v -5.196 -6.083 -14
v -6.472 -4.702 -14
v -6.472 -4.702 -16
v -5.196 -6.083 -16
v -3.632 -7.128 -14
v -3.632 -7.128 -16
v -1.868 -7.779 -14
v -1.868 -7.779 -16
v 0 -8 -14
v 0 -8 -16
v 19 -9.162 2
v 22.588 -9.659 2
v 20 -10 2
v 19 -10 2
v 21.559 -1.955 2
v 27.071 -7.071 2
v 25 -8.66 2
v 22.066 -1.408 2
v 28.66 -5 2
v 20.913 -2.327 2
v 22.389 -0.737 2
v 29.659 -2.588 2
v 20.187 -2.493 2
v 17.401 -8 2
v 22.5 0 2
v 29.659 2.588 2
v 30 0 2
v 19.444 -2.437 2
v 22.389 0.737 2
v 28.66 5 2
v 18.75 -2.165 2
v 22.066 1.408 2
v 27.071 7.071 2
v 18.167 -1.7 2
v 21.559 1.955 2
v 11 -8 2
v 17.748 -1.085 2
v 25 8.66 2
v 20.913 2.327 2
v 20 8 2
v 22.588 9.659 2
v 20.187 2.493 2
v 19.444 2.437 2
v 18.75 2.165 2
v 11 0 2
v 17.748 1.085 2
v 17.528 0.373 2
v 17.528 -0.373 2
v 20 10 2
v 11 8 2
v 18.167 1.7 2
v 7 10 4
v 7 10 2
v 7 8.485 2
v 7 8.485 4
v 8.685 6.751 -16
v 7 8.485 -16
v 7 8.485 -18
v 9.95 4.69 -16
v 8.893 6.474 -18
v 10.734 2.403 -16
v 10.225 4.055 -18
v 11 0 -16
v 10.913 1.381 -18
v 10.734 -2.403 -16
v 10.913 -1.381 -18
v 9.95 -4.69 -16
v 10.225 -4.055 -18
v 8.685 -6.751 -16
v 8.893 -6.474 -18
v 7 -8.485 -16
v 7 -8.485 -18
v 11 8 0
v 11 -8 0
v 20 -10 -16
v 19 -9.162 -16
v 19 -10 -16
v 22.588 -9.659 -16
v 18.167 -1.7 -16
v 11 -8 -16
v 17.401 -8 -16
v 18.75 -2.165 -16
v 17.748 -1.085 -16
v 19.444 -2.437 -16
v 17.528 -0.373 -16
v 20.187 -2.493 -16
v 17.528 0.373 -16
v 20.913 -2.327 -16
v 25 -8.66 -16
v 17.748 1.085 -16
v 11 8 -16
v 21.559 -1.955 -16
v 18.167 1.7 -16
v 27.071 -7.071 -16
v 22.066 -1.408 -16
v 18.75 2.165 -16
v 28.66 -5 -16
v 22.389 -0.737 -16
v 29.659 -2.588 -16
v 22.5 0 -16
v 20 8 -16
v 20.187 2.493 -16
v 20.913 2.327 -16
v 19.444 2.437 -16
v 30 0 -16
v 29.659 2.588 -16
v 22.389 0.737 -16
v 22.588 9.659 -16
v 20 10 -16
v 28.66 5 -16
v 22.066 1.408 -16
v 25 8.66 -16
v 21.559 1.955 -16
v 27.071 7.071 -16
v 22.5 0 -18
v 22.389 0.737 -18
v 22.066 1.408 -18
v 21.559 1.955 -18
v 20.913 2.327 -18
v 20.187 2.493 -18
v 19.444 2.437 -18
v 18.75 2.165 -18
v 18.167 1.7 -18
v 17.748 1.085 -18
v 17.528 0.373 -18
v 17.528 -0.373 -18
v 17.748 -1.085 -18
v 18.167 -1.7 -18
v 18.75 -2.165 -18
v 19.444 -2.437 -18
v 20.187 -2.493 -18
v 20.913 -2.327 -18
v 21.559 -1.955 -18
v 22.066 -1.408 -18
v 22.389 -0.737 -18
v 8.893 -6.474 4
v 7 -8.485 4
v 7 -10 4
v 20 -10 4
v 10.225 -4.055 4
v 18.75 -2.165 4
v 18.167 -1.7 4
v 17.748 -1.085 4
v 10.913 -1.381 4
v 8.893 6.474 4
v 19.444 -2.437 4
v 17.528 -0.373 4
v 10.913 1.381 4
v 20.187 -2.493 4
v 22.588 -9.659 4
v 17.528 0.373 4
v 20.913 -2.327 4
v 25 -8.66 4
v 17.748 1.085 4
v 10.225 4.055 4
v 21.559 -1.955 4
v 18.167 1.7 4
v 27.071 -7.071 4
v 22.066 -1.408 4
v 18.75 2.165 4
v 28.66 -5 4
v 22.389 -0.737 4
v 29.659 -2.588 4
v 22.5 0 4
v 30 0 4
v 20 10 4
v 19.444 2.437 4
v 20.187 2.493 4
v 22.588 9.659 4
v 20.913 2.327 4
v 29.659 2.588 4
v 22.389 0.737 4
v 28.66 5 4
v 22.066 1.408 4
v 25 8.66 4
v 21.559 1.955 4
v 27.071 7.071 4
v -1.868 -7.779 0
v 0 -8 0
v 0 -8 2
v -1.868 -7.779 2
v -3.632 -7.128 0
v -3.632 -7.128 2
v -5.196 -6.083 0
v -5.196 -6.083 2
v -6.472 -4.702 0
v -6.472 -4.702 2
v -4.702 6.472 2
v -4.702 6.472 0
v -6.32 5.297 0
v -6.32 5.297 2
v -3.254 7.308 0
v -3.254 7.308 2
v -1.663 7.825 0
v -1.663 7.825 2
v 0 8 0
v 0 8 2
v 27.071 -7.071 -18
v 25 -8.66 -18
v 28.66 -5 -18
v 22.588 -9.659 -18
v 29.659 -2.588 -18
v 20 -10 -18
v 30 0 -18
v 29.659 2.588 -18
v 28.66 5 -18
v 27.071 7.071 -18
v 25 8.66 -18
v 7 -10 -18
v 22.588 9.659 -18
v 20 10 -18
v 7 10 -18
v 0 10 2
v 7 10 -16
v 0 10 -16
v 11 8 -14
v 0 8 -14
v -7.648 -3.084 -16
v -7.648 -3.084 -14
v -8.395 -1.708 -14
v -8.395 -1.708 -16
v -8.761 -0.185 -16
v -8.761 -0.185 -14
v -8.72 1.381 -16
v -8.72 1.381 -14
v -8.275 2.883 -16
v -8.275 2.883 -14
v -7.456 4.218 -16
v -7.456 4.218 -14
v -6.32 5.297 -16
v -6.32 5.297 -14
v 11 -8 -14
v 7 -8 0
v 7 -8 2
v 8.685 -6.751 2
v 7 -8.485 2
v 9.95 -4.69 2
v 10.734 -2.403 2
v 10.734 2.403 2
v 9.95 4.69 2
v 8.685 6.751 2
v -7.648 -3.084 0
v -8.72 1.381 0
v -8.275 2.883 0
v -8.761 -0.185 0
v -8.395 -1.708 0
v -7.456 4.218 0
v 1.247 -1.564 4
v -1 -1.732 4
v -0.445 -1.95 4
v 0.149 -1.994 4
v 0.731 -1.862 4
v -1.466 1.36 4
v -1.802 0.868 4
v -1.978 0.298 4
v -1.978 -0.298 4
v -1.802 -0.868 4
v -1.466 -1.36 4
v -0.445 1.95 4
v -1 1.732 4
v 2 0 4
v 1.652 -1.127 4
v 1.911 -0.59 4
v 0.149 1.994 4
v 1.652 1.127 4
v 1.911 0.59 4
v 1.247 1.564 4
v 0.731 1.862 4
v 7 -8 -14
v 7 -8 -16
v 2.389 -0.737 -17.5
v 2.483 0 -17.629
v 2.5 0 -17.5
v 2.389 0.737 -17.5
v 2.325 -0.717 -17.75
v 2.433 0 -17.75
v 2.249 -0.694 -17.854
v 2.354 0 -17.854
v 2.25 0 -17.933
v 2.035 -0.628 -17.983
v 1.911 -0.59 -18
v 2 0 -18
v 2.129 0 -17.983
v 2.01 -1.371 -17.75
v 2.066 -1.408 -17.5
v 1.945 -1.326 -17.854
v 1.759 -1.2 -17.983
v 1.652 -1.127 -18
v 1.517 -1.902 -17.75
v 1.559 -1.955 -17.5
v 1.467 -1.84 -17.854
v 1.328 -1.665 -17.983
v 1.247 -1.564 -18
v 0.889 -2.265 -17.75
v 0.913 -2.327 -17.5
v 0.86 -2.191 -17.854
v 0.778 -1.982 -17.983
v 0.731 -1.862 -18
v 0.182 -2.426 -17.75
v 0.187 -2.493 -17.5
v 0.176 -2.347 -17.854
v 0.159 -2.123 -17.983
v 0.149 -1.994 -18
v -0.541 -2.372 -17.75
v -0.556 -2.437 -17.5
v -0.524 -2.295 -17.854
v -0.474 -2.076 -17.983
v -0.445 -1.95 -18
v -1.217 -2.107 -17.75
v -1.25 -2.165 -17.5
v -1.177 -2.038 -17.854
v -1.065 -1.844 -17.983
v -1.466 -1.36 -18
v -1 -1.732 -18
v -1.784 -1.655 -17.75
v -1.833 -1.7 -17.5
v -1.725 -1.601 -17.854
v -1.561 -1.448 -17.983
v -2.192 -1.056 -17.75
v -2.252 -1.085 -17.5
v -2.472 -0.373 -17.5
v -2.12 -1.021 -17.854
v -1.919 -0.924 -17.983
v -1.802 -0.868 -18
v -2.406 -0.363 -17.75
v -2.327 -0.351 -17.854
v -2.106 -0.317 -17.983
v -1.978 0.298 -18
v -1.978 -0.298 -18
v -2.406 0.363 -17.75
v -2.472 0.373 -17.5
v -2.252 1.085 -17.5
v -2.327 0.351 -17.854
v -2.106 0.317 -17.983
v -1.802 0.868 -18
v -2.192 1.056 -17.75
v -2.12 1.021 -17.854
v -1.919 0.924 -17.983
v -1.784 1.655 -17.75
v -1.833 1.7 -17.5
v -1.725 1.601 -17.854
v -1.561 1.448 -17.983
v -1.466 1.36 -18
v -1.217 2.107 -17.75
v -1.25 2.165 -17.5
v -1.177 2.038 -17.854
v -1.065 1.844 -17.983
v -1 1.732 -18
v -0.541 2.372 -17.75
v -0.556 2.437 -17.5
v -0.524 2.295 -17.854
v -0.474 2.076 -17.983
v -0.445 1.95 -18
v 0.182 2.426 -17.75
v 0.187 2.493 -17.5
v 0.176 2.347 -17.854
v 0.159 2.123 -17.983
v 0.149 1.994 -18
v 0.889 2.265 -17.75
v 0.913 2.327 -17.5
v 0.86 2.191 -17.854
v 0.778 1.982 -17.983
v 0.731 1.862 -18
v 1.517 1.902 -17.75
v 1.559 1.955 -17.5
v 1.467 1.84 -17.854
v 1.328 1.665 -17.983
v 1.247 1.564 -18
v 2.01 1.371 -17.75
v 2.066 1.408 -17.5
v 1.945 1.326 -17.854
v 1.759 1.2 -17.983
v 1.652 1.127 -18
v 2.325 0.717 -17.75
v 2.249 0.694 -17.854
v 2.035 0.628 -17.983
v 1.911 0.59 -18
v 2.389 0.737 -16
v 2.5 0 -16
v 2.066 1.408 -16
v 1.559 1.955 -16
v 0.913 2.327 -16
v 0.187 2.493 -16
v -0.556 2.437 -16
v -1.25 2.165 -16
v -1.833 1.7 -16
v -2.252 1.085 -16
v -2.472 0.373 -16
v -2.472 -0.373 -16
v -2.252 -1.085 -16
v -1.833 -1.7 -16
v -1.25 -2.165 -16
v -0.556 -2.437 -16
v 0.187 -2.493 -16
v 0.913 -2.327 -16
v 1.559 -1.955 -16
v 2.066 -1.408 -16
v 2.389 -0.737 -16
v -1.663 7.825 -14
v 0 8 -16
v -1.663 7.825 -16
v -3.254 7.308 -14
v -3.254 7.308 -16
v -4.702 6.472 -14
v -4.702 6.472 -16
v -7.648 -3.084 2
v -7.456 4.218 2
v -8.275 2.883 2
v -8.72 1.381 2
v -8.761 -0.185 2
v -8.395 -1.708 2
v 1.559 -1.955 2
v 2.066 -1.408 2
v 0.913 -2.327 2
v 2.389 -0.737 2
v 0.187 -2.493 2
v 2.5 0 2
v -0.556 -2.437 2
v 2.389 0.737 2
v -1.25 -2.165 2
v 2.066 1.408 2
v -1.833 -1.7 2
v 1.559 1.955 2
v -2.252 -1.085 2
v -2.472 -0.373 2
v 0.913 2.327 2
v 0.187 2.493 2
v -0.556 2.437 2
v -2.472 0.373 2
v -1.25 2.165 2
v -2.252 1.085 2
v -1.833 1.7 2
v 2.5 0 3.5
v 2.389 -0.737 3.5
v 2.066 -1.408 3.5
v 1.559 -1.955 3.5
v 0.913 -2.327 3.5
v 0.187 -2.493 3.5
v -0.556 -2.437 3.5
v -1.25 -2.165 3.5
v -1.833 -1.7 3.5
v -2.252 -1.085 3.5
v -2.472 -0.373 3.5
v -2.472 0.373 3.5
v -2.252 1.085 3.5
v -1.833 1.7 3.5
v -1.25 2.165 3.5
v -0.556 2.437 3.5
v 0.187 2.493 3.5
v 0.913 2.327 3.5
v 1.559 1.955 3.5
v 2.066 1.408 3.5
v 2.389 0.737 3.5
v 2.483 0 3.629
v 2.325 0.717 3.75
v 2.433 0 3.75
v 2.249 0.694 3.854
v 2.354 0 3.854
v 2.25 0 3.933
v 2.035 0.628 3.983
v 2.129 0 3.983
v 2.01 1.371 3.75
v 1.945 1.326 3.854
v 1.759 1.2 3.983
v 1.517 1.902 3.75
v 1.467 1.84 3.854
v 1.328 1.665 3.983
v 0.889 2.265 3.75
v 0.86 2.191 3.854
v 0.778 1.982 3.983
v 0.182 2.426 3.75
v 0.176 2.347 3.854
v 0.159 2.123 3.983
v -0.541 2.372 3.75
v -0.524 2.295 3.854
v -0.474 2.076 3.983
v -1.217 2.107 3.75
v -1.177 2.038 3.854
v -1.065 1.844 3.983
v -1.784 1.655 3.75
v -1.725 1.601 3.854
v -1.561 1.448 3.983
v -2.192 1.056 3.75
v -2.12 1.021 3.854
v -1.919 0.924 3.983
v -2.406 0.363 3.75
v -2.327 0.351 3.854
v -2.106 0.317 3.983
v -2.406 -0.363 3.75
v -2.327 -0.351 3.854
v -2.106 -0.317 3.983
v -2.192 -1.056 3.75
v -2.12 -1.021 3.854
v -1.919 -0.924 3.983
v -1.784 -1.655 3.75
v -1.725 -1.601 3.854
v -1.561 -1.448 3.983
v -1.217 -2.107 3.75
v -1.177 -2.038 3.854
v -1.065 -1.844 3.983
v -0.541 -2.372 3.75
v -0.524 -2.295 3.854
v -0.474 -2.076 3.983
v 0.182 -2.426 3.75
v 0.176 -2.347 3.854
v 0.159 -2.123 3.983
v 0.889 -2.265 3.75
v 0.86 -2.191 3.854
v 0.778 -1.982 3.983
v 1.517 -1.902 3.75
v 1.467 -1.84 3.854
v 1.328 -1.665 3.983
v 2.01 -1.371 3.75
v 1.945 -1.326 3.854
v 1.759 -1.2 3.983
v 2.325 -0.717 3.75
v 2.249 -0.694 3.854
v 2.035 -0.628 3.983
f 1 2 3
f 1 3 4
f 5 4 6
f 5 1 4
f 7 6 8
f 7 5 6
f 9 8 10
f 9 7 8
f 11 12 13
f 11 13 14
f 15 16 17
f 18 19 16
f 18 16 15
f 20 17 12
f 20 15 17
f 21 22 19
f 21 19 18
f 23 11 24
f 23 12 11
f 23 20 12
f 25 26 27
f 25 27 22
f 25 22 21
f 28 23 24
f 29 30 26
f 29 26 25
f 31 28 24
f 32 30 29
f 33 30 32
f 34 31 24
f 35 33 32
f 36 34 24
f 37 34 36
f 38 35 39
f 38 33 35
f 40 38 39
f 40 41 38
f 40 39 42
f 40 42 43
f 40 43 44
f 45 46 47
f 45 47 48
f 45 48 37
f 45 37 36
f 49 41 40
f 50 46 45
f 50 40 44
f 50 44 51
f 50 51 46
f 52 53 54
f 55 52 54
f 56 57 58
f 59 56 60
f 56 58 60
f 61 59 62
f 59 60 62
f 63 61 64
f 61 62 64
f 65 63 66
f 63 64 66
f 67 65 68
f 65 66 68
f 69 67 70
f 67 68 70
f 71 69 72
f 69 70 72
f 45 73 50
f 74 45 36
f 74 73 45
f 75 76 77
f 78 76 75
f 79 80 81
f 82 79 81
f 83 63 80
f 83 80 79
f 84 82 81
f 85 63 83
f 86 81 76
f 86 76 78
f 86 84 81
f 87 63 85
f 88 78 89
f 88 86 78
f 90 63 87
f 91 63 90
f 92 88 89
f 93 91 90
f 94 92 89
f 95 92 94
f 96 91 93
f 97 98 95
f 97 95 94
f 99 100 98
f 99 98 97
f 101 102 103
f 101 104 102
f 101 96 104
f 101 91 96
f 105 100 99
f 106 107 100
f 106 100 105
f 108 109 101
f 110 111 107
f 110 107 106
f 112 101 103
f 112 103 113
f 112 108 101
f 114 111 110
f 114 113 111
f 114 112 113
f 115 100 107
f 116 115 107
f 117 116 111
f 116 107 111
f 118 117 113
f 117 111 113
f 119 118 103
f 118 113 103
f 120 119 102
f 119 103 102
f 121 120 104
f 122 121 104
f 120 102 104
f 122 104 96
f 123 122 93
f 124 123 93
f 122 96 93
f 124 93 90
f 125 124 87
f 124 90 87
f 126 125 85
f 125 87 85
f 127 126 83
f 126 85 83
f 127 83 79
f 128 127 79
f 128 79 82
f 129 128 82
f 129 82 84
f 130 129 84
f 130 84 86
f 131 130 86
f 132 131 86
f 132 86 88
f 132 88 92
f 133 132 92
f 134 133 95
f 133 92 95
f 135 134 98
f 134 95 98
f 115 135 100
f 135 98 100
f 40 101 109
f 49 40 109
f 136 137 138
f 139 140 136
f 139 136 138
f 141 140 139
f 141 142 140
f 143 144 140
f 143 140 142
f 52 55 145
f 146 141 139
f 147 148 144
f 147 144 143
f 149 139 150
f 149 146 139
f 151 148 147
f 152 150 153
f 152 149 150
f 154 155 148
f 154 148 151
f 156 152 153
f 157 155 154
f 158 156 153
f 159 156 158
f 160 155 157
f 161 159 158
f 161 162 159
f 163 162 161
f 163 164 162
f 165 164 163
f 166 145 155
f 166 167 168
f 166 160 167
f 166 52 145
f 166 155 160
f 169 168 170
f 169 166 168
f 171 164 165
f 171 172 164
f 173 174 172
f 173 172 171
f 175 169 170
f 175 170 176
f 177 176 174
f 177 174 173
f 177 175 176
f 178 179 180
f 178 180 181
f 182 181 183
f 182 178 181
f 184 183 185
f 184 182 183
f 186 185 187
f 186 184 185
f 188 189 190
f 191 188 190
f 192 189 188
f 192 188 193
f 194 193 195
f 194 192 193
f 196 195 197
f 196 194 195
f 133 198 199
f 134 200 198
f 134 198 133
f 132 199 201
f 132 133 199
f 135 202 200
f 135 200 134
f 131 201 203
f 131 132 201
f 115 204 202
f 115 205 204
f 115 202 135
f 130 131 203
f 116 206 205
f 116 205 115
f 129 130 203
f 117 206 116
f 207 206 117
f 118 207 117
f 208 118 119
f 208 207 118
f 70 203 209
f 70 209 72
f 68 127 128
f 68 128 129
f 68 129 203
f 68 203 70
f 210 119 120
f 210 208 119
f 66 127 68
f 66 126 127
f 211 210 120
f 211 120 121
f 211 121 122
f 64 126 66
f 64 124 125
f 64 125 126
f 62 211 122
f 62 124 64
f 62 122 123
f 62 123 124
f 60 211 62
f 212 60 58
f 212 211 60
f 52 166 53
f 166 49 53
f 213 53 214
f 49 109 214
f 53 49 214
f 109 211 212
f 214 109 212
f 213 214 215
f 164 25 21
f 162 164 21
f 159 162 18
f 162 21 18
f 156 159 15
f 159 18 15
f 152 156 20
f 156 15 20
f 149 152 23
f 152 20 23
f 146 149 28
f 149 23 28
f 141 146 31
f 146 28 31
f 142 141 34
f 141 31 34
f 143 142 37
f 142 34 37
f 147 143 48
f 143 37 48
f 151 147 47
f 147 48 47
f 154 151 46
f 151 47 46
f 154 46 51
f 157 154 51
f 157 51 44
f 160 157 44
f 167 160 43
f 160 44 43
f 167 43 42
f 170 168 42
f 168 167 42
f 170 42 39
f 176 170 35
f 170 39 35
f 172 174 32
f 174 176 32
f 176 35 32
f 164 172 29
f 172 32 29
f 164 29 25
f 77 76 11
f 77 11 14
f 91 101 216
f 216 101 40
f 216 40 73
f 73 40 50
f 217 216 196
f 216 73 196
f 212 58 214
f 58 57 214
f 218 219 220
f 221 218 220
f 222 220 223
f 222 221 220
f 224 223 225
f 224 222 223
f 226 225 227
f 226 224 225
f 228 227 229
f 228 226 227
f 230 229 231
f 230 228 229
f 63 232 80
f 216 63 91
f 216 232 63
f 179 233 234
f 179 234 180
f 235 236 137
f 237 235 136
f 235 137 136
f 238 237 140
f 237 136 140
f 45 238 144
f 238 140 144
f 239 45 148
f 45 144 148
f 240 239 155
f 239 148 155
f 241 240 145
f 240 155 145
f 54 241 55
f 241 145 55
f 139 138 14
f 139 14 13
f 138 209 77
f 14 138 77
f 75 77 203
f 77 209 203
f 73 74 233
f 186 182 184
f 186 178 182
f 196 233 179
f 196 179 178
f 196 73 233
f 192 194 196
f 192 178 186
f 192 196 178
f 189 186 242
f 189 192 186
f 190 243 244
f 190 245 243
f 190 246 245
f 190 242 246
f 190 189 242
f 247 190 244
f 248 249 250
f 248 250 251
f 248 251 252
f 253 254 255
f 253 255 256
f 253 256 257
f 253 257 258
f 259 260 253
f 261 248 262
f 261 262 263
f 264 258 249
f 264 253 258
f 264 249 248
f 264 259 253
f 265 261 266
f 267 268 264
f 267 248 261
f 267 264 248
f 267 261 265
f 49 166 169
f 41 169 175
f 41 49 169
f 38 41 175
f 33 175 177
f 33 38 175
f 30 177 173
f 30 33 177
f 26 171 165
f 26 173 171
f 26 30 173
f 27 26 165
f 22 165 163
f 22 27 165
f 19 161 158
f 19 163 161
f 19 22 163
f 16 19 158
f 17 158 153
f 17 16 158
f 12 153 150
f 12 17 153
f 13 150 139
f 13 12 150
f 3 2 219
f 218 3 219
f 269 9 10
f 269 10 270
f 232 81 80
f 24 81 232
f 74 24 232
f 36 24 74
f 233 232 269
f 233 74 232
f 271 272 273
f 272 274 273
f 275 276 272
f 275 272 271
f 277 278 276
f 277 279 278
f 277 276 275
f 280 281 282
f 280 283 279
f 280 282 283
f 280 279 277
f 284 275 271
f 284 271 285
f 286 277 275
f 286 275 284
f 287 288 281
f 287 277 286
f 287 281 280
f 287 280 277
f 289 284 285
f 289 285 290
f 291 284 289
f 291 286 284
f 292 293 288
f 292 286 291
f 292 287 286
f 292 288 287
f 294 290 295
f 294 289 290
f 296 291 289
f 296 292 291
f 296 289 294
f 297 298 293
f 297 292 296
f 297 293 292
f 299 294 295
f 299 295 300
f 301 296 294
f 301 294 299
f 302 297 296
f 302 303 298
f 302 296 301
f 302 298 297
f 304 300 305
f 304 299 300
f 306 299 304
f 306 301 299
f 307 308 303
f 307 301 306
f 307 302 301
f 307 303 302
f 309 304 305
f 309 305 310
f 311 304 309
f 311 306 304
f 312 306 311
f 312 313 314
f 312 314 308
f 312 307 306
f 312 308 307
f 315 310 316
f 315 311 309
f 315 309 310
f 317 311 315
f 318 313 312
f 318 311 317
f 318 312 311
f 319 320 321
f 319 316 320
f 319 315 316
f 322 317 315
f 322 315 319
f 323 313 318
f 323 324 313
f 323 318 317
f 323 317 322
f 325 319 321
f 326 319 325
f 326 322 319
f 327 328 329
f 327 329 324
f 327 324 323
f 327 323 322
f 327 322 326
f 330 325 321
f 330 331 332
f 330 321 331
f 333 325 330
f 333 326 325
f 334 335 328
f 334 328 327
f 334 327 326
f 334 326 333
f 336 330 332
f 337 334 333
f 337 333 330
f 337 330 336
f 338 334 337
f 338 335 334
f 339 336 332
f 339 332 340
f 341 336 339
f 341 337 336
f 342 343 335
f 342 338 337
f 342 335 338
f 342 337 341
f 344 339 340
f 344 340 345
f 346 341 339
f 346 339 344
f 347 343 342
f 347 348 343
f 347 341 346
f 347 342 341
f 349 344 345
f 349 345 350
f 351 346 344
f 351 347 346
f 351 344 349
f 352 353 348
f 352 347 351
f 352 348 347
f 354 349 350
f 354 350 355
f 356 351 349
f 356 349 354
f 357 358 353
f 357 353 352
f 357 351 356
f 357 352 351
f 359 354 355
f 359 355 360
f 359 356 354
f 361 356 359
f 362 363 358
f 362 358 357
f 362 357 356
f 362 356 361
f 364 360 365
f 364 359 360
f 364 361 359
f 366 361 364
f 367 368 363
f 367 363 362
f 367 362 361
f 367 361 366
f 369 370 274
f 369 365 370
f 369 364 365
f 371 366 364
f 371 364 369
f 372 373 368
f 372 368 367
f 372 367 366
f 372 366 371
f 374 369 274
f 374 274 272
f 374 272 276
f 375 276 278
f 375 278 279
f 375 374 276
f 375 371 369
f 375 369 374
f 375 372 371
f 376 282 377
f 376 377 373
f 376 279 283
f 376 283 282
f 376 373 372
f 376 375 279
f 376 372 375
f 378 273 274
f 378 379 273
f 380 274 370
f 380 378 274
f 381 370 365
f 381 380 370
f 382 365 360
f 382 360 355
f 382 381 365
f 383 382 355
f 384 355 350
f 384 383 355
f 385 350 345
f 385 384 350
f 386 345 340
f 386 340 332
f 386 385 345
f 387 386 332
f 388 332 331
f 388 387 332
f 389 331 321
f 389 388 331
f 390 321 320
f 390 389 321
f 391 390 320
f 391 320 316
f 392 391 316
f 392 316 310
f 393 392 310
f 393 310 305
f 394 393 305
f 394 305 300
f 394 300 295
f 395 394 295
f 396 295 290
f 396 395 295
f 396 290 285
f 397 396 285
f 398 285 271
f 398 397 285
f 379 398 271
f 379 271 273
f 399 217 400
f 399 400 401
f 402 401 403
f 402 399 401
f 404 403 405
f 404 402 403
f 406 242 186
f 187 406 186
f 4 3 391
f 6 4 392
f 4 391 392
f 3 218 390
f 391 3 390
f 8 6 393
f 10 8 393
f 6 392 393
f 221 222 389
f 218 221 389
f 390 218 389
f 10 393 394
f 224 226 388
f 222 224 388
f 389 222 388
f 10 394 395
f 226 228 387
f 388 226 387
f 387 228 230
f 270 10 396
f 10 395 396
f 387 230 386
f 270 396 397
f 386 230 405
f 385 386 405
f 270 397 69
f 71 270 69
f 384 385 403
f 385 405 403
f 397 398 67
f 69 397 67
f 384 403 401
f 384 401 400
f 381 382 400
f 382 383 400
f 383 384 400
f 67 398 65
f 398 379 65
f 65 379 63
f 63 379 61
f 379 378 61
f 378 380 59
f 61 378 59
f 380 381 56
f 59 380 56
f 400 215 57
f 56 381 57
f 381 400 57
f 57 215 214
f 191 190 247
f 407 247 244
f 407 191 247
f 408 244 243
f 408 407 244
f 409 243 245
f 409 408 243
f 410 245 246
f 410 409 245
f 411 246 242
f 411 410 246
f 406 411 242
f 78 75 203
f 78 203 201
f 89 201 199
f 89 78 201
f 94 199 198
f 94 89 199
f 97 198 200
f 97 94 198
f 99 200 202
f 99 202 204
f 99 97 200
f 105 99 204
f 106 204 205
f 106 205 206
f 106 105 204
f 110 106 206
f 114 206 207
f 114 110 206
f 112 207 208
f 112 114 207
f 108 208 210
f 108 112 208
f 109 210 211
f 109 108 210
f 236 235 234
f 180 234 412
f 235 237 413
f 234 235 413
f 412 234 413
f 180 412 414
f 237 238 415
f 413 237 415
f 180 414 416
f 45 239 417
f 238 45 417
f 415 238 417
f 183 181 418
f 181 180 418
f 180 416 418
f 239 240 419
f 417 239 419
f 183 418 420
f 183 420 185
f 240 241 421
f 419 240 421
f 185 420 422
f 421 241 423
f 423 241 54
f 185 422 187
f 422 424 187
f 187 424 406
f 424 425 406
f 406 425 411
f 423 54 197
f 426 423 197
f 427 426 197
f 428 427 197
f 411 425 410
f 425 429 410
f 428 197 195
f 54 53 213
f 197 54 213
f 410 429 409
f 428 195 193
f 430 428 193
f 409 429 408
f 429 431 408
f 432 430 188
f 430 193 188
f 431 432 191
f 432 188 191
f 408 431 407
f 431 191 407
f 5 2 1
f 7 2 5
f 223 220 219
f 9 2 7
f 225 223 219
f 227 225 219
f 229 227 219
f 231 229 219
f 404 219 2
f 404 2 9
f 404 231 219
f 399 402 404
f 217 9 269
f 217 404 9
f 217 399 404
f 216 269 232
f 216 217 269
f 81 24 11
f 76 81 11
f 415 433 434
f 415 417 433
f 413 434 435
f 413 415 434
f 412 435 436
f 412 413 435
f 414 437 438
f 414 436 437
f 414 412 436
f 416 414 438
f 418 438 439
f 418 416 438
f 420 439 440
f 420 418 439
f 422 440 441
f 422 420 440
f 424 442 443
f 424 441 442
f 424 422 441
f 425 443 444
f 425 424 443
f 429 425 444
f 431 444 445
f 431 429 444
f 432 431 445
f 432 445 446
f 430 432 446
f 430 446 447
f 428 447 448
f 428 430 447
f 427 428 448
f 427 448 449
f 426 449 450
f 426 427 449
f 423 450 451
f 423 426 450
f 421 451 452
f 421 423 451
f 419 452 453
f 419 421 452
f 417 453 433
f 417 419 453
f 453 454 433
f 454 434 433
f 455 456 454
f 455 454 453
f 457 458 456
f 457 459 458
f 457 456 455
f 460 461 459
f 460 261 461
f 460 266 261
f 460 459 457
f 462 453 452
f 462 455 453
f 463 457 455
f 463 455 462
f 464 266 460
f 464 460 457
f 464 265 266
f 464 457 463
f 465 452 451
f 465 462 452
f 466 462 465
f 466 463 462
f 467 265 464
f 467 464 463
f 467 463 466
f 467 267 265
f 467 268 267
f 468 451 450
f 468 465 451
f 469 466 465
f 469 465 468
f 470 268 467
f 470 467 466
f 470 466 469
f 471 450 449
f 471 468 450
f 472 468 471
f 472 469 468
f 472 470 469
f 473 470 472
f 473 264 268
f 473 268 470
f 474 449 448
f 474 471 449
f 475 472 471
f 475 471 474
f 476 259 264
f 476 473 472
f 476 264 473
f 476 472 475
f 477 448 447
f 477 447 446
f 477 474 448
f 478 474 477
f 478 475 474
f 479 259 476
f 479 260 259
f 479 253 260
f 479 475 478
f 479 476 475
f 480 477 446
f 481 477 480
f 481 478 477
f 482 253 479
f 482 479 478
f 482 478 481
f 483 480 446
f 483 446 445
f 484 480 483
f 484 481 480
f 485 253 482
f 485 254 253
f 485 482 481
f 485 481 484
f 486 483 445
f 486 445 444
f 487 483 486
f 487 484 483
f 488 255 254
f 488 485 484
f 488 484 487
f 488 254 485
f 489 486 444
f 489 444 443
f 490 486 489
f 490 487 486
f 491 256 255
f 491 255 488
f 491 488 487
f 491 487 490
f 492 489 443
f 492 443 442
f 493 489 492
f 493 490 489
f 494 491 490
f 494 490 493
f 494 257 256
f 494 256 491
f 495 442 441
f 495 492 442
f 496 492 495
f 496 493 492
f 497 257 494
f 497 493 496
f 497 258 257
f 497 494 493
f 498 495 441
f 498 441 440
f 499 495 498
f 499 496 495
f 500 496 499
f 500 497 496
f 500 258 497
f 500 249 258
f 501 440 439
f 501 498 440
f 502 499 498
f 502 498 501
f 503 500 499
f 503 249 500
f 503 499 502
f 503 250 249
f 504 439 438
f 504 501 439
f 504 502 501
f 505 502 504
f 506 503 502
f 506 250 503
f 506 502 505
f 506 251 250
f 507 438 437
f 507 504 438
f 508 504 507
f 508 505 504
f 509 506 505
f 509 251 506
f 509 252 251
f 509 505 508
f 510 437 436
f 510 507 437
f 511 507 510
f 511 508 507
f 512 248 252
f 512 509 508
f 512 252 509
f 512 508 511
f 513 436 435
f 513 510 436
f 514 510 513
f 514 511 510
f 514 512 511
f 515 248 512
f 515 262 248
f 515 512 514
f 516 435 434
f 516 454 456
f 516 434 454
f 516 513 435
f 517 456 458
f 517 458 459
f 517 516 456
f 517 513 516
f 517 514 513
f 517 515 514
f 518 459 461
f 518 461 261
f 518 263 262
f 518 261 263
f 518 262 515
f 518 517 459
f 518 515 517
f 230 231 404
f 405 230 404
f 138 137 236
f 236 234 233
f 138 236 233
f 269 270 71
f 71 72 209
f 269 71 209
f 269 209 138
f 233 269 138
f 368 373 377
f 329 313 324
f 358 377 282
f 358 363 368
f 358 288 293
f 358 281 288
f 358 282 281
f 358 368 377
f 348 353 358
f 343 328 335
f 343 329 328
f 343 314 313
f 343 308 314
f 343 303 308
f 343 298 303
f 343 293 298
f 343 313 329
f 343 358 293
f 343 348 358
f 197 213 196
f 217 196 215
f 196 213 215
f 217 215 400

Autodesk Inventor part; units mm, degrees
ref_plane "YZ Plane" through (0, 0, 0) normal (1, 0, 0) x (0, 1, 0)
ref_plane "XZ Plane" through (0, 0, 0) normal (0, 1, 0) x (-1, 0, 0)
sketch "Sketch1" plane through (0, 0, 0) normal (0, 0, 1) x (1, 0, 0)
  circle A0 centre (0, 0) radius 2.5
  circle A1 centre (20, 0) radius 2.5
  line L0 (7, 10) -> (20, 10)
  line L1 (7, -10) -> (20, -10)
  arc A2 (20, -10) -> (20, 10) centre (20, 0) ccw
  line L2 (7, 10) -> (7, 8)
  line L3 (7, -10) -> (7, -8)
  line L4 (7, 8) -> (0, 8)
  line L5 (7, -8) -> (0, -8)
  arc A3 (0, 8) -> (0, -8) centre (0, 0) ccw
  dimension "d0" = 5
  dimension "d1" = 20
  dimension "d2" = 10
  dimension "d3" = 2
  dimension "d4" = 13
extrude "Extrusion1" add sketch "Sketch1" along normal blind 4
sketch "Sketch2" plane through (0, 0, 4) normal (0, 0, 1) x (1, 0, 0)
  circle A0 centre (0, 0) radius 2.5 projected
  line L0 (7, 8) -> (0, 8) projected
  arc A1 (0, 8) -> (0, -8) centre (0, 0) ccw projected
  line L1 (0, -8) -> (7, -8) projected
  line L2 (7, -10) -> (20, -10) projected
  line L3 (7, 8) -> (7, -8)
  line L4 (7, -8) -> (0, -8)
  line L5 (7, 8) -> (0, 8)
  arc A2 (0, 8) -> (0, -8) centre (0, 0) ccw
extrude "Extrusion2" cut sketch "Sketch2" against normal blind 2
sketch "Sketch3" plane through (0, 0, 0) normal (0, 0, -1) x (-1, 0, 0)
  circle A0 centre (-20, 0) radius 2.5 projected
  circle A1 centre (0, 0) radius 2.5 projected
  line L0 (-7, 10) -> (-20, 10) projected
  arc A2 (-20, 10) -> (-20, -10) centre (-20, 0) ccw projected
  line L1 (-20, -10) -> (-7, -10) projected
  line L2 (-7, 8) -> (-7, 10) projected
  line L3 (-19, 10) -> (-19, 8)
  line L4 (-19, 8) -> (-11, 8)
  line L5 (-11, 8) -> (-11, -8)
  line L6 (-11, -8) -> (-19, -8)
  line L7 (-19, -8) -> (-19, -10)
  point P0 (-7, -8)
  dimension "d9" = 1
  dimension "d10" = 11
extrude "Extrusion3" cut sketch "Sketch3" against normal blind 2 contours L3 L4 L5 L6 L7 L1 A2 L0
sketch "Sketch4" plane through (0, 0, 4) normal (0, 0, 1) x (1, 0, 0)
  line L0 (7, 10) -> (7, -10) projected
  circle A0 centre (0, 0) radius 2.5 projected
  arc A1 (7, -8.4853) -> (7, 8.4853) centre (0, 0) ccw
  dimension "d15" = 11
extrude "Extrusion4" cut sketch "Sketch4" against normal blind 2 contours A1 L0
sketch "Sketch5" plane through (0, 0, 0) normal (0, 0, -1) x (-1, 0, 0)
  line L0 (0, 8) -> (-7, 8) projected
  line L1 (-7, 10) -> (0, 10)
  line L2 (0, 10) -> (0, 8)
  line L3 (0, 8) -> (-7, 8)
  line L4 (-7, 8) -> (-7, 10)
  arc A0 (0, -8) -> (0, 8) centre (0, 0) ccw projected
extrude "Extrusion5" add sketch "Sketch5" against normal blind 2
sketch "Sketch6" plane through (0, 0, 0) normal (0, 0, -1) x (-1, 0, 0)
  line L0 (0, 10) -> (-19, 10) projected
  line L1 (-19, 8) -> (-20, 8)
  line L2 (-20, 8) -> (-20, 10)
  line L3 (-20, 10) -> (-19, 10)
  line L4 (-19, 10) -> (-19, 8)
  circle A0 centre (-20, 0) radius 2.5 projected
extrude "Extrusion6" add sketch "Sketch6" against normal blind 2 contours L1 L2 L3 L4
sketch "Sketch7" plane through (0, 0, 0) normal (0, 0, -1) x (-1, 0, 0)
  line L0 (-19, -8) -> (-19, -10) projected
  line L1 (-11, -8) -> (-19, -8) projected
  line L2 (-17.4006, -8) -> (-19, -9.162)
  line L3 (-17.4006, -8) -> (-26.8052, 4.9443) construction
  line L4 (-26.8052, 4.9443) -> (-28.4046, 3.7823) construction
  line L5 (-28.4046, 3.7823) -> (-19, -9.162) construction
  circle A0 centre (-20, 0) radius 2.5 projected
  line L6 (-17.4006, -8) -> (-19, -8)
  line L7 (-19, -8) -> (-19, -9.162)
  dimension "d21" = 16
  dimension "d22" = 8
  dimension "d23" = 36
extrude "Extrusion7" cut sketch "Sketch7" against normal blind 2 contours L1 L2 L0
sketch "Sketch9" plane through (0, 0, 2) normal (0, 0, 1) x (1, 0, 0)
  circle A0 centre (0, 0) radius 2.5 projected
  arc A1 (11, 0) -> (7, 8.4853) centre (0, 0) ccw projected
  circle A2 centre (0, 0) radius 2.5
extrude "Extrusion8" add sketch "Sketch9" along normal mid plane 4
fillet "Fillet1" radius 0.5 1 edges at (-2.5, 0, 4)
sketch "Sketch10" plane through (0, 0, 0) normal (0, 0, -1) x (-1, 0, 0)
  arc A0 (0, -8) -> (0, 8) centre (0, 0) ccw projected
  line L0 (0, 10) -> (-20, 10) projected
  line L1 (4.7023, 6.4721) -> (11.1744, 1.7699)
  line L2 (11.1744, 1.7699) -> (6.4721, -4.7023)
  dimension "d30" = 144
extrude "Extrusion9" add sketch "Sketch10" against normal blind 2
fillet "Fillet2" radius 6 1 edges at (-11.1744, 1.7699, 1)
ref_plane "Work Plane1" through (0, 0, -7) normal (0, 0, -1) x (-1, 0, 0)
mirror "Mirror1" about plane through (0, 0, -7) normal (0, 0, -1)
sketch "Sketch11" plane through (0, 0, 0) normal (0, 0, -1) x (-1, 0, 0)
  arc A0 (4.7023, 6.4721) -> (0, 8) centre (0, 0) ccw projected
  line L0 (0, 8) -> (0, 10) projected
  line L1 (0, 10) -> (-20, 10) projected
  line L2 (-20, 10) -> (-20, 8) projected
  line L3 (-20, 8) -> (-11, 8) projected
  line L4 (-11, -8) -> (-17.4006, -8) projected
  line L5 (-17.4006, -8) -> (-19, -9.162) projected
  line L6 (-19, -9.162) -> (-19, -10) projected
  line L7 (-19, -10) -> (-7, -10) projected
  line L8 (-7, -10) -> (-7, -8) projected
  line L9 (-7, -8) -> (0, -8) projected
  line L10 (-11, -8) -> (-7, -8)
  line L11 (-11, 8) -> (0, 8)
extrude "Extrusion10" add sketch "Sketch11" along normal blind 14
properties part number "cable_chain_22" material "ABS Plastic"
